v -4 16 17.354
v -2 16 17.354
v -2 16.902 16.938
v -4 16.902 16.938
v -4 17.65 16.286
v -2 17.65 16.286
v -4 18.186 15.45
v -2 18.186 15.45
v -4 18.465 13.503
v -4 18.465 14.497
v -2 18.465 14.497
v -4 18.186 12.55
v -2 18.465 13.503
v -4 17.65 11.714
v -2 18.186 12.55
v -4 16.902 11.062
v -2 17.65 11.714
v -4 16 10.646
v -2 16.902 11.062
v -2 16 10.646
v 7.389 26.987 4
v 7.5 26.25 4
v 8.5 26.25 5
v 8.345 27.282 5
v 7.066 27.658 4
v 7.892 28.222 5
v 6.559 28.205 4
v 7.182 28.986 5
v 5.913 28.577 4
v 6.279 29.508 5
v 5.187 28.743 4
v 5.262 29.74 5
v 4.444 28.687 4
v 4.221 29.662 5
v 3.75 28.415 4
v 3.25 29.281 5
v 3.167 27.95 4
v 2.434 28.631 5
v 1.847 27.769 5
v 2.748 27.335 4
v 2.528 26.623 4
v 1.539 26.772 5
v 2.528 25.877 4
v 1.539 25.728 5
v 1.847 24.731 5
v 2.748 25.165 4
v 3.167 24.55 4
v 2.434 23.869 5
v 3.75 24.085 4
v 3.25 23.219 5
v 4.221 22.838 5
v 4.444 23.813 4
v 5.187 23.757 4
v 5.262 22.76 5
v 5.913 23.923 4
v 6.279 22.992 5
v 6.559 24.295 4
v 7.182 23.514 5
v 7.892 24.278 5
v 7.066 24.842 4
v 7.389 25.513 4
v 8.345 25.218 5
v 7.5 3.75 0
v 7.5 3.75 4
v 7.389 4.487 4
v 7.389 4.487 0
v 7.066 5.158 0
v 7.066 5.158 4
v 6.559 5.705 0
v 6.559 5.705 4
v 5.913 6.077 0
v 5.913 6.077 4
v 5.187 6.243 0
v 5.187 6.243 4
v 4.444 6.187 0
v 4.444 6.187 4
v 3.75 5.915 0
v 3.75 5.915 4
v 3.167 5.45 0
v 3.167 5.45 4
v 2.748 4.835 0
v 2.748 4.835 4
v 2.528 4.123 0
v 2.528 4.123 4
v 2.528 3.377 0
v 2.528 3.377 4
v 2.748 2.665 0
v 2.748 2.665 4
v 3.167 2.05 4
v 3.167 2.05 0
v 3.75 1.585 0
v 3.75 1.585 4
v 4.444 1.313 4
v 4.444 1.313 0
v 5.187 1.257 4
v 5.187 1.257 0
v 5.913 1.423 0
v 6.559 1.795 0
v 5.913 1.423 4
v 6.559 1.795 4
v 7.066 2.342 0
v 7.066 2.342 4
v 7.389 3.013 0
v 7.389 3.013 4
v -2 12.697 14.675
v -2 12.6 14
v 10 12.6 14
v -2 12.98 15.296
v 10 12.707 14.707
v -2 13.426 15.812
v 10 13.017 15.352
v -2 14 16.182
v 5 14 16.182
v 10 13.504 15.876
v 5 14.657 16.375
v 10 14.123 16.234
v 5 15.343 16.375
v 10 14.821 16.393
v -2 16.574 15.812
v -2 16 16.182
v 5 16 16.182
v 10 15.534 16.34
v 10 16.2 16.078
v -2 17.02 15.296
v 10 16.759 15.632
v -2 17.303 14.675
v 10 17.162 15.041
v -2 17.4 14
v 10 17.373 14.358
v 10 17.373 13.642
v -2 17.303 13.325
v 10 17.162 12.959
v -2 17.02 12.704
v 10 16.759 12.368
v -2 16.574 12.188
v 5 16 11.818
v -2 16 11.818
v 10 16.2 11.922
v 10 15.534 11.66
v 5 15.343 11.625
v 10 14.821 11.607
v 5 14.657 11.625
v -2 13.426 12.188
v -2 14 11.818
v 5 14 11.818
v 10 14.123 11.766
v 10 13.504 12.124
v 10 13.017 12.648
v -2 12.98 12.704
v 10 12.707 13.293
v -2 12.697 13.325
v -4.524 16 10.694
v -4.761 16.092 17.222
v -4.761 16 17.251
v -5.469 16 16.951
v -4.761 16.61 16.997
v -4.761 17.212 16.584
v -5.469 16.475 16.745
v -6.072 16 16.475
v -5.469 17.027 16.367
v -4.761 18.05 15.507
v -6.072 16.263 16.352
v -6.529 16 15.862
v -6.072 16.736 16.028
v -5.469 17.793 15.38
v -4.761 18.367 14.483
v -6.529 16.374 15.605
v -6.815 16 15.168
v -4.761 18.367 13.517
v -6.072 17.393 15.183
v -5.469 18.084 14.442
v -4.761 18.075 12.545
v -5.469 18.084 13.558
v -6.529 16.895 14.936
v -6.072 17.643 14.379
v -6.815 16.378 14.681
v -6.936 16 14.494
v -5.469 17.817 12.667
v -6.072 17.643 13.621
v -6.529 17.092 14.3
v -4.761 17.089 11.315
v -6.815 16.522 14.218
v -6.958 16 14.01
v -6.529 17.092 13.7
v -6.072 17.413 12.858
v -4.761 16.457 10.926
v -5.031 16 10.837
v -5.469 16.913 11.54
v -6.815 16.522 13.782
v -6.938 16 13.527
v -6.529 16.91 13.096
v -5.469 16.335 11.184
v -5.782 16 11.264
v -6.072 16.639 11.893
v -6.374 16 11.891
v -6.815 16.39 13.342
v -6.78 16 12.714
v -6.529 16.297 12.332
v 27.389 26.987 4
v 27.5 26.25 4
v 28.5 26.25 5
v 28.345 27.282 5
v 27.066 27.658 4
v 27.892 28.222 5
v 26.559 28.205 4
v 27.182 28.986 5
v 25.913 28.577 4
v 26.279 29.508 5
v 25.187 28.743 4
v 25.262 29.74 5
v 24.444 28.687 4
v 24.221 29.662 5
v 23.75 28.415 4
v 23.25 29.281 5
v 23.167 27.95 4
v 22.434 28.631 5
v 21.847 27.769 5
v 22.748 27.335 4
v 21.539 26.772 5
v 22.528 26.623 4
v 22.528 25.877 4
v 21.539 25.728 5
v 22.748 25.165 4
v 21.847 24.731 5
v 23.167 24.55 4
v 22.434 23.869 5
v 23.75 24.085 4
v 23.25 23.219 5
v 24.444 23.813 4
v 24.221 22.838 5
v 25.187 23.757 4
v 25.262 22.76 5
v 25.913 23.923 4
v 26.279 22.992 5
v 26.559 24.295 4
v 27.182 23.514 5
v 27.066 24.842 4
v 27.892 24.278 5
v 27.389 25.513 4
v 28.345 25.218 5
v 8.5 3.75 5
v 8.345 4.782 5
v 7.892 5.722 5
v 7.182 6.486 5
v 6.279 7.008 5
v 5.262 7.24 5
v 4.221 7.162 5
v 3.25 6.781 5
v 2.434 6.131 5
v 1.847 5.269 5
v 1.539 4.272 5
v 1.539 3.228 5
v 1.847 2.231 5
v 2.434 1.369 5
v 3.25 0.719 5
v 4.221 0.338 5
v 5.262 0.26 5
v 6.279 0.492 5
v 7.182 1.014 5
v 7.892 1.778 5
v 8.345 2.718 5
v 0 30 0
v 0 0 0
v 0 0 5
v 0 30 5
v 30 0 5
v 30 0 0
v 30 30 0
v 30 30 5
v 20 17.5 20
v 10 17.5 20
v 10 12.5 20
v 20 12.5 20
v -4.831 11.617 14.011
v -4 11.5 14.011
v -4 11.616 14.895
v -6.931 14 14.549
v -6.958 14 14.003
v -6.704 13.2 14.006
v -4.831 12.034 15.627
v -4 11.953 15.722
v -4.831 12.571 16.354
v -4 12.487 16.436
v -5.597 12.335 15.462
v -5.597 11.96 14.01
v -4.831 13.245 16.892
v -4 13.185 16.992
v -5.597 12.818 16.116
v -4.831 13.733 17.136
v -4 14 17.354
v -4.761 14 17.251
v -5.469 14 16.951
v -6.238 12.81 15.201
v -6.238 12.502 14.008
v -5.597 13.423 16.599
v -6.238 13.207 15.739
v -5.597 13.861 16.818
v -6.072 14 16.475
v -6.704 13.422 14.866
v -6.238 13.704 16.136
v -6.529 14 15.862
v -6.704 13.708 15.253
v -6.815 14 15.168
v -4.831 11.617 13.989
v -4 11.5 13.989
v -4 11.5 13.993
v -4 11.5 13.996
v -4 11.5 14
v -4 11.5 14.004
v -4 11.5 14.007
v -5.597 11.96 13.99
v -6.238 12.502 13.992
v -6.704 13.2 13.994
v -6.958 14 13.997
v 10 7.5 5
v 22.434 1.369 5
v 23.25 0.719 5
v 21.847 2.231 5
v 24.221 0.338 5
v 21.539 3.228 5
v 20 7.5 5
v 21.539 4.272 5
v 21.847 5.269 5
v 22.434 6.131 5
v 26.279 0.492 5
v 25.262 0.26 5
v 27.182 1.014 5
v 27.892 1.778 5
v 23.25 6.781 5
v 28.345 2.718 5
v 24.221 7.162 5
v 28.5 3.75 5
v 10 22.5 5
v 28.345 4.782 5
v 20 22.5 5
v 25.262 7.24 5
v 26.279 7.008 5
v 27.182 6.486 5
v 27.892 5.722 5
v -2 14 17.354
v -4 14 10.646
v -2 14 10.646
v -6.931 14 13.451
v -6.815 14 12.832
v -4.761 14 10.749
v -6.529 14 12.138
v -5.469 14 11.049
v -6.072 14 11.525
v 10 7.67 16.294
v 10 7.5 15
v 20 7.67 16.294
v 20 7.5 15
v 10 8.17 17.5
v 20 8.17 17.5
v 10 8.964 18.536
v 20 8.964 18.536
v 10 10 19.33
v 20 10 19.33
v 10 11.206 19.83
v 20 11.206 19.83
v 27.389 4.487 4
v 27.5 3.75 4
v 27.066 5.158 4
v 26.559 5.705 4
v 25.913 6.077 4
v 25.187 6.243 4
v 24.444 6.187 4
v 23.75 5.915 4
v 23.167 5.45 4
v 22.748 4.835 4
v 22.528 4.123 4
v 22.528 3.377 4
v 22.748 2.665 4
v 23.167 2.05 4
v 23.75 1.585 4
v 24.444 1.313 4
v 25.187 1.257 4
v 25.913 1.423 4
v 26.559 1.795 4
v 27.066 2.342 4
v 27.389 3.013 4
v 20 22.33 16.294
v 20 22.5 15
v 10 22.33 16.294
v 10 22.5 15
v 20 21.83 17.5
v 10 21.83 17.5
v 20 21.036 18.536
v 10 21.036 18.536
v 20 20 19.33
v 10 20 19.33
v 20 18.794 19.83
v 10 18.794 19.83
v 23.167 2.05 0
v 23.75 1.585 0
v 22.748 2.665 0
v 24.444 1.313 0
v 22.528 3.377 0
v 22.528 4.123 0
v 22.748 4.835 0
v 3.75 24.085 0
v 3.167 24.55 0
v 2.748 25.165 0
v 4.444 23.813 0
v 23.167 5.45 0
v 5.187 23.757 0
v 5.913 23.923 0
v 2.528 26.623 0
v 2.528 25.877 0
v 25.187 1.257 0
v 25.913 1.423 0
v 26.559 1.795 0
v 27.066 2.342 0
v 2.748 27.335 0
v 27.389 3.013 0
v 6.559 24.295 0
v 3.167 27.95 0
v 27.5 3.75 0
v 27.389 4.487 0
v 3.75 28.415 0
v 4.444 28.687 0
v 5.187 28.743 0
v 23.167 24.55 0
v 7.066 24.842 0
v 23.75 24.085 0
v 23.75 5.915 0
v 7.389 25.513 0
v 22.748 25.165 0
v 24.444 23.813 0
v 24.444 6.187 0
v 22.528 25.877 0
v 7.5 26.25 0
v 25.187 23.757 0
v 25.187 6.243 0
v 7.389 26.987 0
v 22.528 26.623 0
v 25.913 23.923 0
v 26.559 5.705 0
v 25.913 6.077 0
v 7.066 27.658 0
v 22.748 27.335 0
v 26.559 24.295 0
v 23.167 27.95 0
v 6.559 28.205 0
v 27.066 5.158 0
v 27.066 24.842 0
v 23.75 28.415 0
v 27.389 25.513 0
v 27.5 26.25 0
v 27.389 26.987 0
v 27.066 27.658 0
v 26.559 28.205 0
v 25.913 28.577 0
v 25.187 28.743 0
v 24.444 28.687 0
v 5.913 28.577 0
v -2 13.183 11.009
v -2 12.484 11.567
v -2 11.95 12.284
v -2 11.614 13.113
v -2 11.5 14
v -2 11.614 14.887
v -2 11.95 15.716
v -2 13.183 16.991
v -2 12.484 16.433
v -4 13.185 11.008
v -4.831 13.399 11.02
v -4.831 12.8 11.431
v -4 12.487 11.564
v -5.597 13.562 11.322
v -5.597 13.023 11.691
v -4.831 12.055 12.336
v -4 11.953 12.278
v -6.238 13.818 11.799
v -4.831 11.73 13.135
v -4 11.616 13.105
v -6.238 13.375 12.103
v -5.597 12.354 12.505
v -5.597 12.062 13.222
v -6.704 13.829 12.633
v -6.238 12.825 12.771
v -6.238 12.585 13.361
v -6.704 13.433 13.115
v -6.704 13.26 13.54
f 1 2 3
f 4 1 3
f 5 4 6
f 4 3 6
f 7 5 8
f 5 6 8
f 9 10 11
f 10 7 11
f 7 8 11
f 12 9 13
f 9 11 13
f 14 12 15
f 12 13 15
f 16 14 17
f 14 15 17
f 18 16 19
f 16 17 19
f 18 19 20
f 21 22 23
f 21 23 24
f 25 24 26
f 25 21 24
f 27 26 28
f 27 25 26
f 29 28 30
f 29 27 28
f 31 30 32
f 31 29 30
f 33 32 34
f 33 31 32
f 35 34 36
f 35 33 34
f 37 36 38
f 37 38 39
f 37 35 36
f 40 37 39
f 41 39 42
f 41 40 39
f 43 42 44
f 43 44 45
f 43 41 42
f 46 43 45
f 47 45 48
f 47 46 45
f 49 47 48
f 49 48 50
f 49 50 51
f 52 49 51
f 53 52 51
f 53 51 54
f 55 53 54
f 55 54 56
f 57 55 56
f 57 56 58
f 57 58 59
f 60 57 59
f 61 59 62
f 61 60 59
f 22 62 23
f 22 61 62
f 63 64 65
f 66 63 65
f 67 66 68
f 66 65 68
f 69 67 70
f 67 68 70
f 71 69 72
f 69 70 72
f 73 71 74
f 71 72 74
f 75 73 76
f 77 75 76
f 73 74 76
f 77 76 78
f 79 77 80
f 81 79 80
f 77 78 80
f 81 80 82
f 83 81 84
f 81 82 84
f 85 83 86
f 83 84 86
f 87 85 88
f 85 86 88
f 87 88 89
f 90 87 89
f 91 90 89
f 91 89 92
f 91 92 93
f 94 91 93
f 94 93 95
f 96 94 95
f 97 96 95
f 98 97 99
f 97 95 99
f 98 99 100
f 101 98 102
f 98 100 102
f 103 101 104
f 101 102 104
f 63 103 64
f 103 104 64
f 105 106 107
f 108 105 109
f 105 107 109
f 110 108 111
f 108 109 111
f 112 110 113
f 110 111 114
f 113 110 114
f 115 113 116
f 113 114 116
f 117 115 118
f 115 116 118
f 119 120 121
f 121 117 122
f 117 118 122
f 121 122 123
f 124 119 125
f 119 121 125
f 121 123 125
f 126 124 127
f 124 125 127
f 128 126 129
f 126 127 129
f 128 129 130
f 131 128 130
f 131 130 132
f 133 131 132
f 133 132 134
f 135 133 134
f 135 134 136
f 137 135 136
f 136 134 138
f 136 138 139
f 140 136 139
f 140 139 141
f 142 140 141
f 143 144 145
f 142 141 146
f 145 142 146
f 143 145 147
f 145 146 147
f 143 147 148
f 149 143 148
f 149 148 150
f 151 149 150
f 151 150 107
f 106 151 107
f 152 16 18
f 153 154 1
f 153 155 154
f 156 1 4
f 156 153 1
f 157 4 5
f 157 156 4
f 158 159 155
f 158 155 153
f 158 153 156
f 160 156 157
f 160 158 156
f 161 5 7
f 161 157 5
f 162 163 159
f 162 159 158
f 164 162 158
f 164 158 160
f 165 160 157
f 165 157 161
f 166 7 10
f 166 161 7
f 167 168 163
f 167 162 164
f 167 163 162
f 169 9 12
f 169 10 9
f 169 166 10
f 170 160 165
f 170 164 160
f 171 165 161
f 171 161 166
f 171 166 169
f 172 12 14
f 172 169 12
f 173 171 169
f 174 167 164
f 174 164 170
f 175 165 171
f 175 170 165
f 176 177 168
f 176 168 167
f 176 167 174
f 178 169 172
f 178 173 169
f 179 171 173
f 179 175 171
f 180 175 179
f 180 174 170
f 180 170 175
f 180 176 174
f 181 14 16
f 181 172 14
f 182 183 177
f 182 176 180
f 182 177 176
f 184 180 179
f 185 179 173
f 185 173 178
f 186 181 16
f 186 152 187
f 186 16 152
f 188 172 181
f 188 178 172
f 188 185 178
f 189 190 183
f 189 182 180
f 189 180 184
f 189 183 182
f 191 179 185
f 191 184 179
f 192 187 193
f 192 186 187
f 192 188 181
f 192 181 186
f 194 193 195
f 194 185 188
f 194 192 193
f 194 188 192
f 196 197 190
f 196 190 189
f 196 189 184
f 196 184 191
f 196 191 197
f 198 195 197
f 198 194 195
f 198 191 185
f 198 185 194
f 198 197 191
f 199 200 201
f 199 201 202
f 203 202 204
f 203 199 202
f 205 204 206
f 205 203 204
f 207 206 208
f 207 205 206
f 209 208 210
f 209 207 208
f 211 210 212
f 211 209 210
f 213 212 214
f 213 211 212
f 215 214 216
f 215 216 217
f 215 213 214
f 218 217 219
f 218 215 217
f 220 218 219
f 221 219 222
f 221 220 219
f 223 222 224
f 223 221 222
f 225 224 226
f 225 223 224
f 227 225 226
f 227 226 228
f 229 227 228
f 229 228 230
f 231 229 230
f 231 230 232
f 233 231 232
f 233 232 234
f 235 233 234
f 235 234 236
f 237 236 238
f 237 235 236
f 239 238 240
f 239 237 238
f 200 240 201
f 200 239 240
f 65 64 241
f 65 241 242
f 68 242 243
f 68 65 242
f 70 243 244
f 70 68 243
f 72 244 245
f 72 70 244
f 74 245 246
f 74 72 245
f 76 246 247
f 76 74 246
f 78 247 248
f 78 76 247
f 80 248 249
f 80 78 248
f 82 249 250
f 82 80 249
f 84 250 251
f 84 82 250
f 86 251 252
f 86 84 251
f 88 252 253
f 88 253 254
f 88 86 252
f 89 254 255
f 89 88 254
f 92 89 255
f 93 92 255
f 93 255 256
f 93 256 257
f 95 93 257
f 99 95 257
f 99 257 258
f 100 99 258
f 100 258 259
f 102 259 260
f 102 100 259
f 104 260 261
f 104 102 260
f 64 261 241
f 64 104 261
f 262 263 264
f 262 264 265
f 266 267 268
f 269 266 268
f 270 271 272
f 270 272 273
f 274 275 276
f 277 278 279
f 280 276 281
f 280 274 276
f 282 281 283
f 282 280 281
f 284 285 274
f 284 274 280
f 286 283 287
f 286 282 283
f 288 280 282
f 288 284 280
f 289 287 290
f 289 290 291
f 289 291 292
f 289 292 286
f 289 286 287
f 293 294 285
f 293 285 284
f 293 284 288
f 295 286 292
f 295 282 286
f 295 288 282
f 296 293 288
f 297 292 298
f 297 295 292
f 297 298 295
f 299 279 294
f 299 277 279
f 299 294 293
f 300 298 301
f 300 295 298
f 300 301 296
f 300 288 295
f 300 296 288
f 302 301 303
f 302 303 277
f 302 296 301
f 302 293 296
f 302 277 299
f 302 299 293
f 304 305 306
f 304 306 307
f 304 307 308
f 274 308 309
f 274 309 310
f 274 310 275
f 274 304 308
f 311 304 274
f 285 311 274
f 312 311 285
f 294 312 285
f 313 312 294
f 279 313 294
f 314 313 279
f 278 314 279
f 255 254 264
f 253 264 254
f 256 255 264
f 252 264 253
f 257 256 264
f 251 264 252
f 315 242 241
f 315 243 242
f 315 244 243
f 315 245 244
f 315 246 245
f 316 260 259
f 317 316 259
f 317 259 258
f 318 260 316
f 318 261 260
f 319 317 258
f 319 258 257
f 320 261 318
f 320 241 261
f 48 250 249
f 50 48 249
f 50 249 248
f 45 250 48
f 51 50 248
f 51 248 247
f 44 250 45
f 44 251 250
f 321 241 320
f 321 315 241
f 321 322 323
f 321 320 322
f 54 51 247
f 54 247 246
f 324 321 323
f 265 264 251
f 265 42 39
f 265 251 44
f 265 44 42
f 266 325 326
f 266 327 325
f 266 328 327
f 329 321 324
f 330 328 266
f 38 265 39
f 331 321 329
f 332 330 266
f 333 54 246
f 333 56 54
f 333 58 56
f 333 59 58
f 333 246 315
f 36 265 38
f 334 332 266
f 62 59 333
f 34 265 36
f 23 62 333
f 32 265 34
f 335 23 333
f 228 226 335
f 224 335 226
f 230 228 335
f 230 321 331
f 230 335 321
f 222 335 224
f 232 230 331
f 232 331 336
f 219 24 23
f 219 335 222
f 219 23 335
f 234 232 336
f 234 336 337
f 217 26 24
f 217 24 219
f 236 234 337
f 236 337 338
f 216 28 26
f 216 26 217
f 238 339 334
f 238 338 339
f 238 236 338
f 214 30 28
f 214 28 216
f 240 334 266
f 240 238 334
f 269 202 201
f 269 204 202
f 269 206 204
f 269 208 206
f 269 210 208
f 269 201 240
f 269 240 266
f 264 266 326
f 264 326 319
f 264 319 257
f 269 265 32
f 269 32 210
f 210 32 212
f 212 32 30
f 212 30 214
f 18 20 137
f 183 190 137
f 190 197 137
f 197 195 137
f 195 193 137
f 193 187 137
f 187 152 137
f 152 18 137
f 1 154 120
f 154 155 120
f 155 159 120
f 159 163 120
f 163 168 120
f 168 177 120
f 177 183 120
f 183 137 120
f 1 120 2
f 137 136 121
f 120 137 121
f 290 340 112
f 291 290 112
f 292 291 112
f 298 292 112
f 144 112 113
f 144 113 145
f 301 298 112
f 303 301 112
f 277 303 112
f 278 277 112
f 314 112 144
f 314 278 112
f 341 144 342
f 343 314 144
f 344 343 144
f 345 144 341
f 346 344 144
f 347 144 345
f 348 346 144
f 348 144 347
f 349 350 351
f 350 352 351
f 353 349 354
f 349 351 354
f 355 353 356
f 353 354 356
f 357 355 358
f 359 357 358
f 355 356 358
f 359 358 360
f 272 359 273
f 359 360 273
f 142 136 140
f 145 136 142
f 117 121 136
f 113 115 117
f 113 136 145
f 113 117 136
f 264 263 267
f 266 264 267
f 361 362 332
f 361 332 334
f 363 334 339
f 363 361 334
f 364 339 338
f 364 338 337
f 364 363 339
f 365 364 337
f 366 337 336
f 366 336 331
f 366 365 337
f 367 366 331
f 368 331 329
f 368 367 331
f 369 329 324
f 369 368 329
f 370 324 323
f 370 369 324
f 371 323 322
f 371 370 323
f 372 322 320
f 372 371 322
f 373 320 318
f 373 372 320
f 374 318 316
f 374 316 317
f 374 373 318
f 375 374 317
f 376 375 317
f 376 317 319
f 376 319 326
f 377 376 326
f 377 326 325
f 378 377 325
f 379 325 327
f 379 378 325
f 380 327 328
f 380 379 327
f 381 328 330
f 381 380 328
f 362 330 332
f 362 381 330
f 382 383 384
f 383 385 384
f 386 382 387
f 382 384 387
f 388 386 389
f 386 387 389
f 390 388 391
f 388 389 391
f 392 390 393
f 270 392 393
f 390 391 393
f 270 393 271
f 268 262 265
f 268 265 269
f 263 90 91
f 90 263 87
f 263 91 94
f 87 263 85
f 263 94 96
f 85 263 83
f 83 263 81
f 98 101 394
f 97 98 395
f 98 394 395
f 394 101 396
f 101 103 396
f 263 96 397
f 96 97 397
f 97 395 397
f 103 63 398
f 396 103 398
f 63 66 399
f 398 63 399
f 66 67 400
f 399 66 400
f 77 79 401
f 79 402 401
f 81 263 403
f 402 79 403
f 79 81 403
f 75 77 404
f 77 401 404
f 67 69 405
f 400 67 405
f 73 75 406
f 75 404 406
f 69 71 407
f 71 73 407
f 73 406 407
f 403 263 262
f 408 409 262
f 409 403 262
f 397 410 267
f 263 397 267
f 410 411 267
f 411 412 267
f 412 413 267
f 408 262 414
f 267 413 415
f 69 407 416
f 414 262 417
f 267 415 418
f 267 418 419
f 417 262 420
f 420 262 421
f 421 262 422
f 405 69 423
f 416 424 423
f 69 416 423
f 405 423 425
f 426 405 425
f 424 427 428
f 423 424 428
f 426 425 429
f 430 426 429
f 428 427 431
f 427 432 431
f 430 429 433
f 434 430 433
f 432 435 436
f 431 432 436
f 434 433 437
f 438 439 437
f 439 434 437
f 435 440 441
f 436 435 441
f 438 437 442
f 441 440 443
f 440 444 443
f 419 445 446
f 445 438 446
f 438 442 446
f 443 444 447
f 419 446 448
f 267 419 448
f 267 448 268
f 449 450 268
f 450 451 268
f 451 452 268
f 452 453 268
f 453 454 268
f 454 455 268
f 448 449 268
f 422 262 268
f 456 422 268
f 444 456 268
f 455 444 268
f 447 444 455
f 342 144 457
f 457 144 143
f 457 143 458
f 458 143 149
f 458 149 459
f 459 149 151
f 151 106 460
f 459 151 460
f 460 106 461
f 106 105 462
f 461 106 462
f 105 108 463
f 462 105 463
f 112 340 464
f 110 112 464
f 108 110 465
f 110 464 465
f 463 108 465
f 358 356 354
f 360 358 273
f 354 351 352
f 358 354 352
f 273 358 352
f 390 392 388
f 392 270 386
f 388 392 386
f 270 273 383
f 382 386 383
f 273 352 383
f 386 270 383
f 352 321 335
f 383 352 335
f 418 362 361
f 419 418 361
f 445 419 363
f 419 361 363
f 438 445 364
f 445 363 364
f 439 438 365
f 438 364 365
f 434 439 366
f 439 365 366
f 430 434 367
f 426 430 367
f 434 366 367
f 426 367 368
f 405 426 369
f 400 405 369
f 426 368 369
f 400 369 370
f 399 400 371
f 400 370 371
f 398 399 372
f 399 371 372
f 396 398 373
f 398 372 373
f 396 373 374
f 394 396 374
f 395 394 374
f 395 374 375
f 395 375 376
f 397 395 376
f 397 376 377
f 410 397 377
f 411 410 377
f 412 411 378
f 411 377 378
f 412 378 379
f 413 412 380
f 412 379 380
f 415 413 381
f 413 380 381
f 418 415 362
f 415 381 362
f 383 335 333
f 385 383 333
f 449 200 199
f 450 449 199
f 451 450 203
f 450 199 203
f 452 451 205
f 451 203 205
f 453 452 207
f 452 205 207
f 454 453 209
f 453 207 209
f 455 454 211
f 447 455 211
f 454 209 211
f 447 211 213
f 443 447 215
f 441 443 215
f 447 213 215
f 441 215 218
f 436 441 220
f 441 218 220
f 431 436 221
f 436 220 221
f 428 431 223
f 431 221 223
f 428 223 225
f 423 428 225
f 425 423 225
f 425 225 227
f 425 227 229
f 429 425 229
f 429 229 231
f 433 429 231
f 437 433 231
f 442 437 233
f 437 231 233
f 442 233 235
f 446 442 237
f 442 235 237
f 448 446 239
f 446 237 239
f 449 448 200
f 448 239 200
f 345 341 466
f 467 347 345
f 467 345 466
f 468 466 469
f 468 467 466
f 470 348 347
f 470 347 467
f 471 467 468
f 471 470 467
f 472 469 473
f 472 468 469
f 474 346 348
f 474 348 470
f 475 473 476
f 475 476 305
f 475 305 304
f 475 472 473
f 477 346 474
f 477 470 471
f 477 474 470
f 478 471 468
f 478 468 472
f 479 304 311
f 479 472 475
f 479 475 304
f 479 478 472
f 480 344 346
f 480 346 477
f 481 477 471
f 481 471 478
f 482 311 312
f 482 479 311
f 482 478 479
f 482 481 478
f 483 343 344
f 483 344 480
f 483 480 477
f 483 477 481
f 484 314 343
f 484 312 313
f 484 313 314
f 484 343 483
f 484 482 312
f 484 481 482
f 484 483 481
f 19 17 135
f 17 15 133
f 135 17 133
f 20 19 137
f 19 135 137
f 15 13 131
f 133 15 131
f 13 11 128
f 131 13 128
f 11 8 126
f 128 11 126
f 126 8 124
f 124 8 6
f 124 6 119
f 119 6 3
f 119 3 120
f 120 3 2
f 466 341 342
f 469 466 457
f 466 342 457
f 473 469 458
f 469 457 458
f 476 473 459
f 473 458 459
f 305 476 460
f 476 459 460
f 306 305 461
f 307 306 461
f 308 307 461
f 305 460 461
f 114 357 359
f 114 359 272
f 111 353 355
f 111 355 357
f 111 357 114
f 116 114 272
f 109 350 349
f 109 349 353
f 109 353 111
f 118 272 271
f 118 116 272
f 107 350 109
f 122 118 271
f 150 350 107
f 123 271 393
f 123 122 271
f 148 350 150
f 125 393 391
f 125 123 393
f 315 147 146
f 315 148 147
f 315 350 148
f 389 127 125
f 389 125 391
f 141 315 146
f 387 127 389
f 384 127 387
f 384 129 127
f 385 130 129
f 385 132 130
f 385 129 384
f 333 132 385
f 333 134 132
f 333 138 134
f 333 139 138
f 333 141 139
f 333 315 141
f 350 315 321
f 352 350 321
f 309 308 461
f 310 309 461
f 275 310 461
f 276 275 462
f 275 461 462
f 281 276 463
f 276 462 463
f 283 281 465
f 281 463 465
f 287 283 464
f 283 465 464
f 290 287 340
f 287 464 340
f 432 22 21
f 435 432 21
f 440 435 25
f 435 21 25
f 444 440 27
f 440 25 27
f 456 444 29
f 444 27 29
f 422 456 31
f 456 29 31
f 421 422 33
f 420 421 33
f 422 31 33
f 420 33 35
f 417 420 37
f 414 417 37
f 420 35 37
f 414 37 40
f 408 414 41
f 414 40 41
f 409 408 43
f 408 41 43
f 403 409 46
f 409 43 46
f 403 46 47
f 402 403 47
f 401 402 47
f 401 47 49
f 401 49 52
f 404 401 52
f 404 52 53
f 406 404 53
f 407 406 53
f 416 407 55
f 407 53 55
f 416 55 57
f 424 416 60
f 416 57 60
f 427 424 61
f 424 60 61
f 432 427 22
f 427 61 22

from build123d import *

# Parameters (mm, degrees)
F0_W         = 30
F0_H         = 30
F1_DEPTH     = 5
F2_W         = 5
F2_H         = 15
F3_DEPTH     = 15
F4_R         = 2.4
F5_DEPTH     = 12
F6_R         = 2.5
F7_DEPTH     = 5
F8_SIZE      = 1
F9_R         = 5
F11_DEPTH    = 5
F12_T2_ANGLE = 359.64
F12_T4_ANGLE = 359.64
F13_DEPTH    = 7


# Not quite as in the source:
# - a fillet or chamfer that OpenCascade refuses, or shapes differently, is made with other operations: its cross-section is extruded or revolved along the edge and cut away or added


with BuildPart() as f1:
    # F0 (on Top) → F1 (new body)
    with BuildSketch(Plane.XY):
        with Locations((15, 15)):
            Rectangle(F0_W, F0_H)
    extrude(amount=F1_DEPTH)

    # F2 (on face) → F3 (join)
    with BuildSketch(Plane.XY.offset(5)):
        with Locations((17.5, 15)):
            Rectangle(F2_W, F2_H)
        with Locations((12.5, 15)):
            Rectangle(F2_W, F2_H)
    extrude(amount=F3_DEPTH)

    # F4 (on face) → F5 (join)
    with BuildSketch(Plane(origin=(10, 0, 0), x_dir=(0, -1, 0), z_dir=(-1, 0, 0))):
        with Locations((-15, 14)):
            Circle(F4_R)
    extrude(amount=F5_DEPTH)

    # F6 (on face) → F7 (cut, through all)
    with BuildSketch(Plane.XY.offset(5)):
        with Locations((25, 26.25)):
            Circle(F6_R)
        with Locations((5, 26.25)):
            Circle(F6_R)
        with Locations((5, 3.75)):
            Circle(F6_R)
        with Locations((25, 3.75)):
            Circle(F6_R)
    extrude(amount=-F7_DEPTH, mode=Mode.SUBTRACT)

    # F8
    f8_edges = [f1.edges().sort_by_distance(p)[0] for p in [
        (2.5, 26.25, 5),
        (22.5, 26.25, 5),
        (22.5, 3.75, 5),
        (2.5, 3.75, 5),
    ]]
    chamfer(f8_edges, length=F8_SIZE)

    # F9
    f9_edges = [f1.edges().sort_by_distance(p)[0] for p in [
        (15, 22.5, 20),
        (15, 7.5, 20),
    ]]
    fillet(f9_edges, radius=F9_R)

    # F10 (on face) → F11 (join)
    with BuildSketch(Plane(origin=(-2, 0, 0), x_dir=(0, -1, 0), z_dir=(-1, 0, 0))):
        with BuildLine():
            Line((-16, 16.1817424229), (-16, 17.3541019662))
            ThreePointArc((-16, 17.3541019662), (-18.5, 14), (-16, 10.6458980338))
            Line((-16, 10.6458980338), (-16, 11.8182575771))
            ThreePointArc((-16, 11.8182575771), (-17.4, 14), (-16, 16.1817424229))
        make_face()
        with BuildLine():
            ThreePointArc((-14, 10.6458980338), (-12.1937569599, 11.9083499337), (-11.5, 14))
            ThreePointArc((-11.5, 14), (-12.1937569599, 16.0916500663), (-14, 17.3541019662))
            Line((-14, 17.3541019662), (-14, 16.1817424229))
            ThreePointArc((-14, 16.1817424229), (-12.9800990123, 15.2961481397), (-12.6, 14))
            ThreePointArc((-12.6, 14), (-12.9800990123, 12.7038518603), (-14, 11.8182575771))
            Line((-14, 11.8182575771), (-14, 10.6458980338))
        make_face()
        with BuildLine():
            ThreePointArc((-12.6, 14), (-12.9800990123, 15.2961481397), (-14, 16.1817424229))
            Line((-14, 16.1817424229), (-14, 11.8182575771))
            ThreePointArc((-14, 11.8182575771), (-12.9800990123, 12.7038518603), (-12.6, 14))
        make_face()
        with BuildLine():
            Line((-16, 11.8182575771), (-16, 16.1817424229))
            ThreePointArc((-16, 16.1817424229), (-17.4, 14), (-16, 11.8182575771))
        make_face()
    extrude(amount=F11_DEPTH)

    # F12: fillet of radius 3 on 2 edges, made by hand

    # F12_s1 → F12_t2 (revolve, cut)
    with BuildSketch(Plane(origin=(0, 0.0441300513, 14.0469854057), x_dir=(1, 0, 0), z_dir=(0, -0.0031415875, -0.9999950652))):
        with BuildLine():
            ThreePointArc((-4, -11.4559437532), (-6.1213203436, -12.3346234097), (-7, -14.4559437532))
            Line((-7, -14.4559437532), (-7, -11.4559437532))
            Line((-7, -11.4559437532), (-4, -11.4559437532))
        make_face()
    revolve(axis=Axis((-7, 15, 14), (-1, 0, 0)), revolution_arc=F12_T2_ANGLE, mode=Mode.SUBTRACT)

    # F12_s3 → F12_t4 (revolve, cut)
    with BuildSketch(Plane(origin=(0, 0.0441300513, 14.0469854057), x_dir=(1, 0, 0), z_dir=(0, 0.0031415875, 0.9999950652))):
        with BuildLine():
            ThreePointArc((-4, 18.4559437532), (-6.1213203436, 17.5772640968), (-7, 15.4559437532))
            Line((-7, 15.4559437532), (-7, 18.4559437532))
            Line((-7, 18.4559437532), (-4, 18.4559437532))
        make_face()
    revolve(axis=Axis((-7, 15, 14), (-1, 0, 0)), revolution_arc=F12_T4_ANGLE, mode=Mode.SUBTRACT)

    # F13 (cut): a face of the model
    f13_faces = [f1.faces().sort_by_distance(p)[0] for p in [
        (-2, 15, 14),
    ]]
    extrude(f13_faces, amount=-F13_DEPTH, mode=Mode.SUBTRACT)


solid = f1.part
